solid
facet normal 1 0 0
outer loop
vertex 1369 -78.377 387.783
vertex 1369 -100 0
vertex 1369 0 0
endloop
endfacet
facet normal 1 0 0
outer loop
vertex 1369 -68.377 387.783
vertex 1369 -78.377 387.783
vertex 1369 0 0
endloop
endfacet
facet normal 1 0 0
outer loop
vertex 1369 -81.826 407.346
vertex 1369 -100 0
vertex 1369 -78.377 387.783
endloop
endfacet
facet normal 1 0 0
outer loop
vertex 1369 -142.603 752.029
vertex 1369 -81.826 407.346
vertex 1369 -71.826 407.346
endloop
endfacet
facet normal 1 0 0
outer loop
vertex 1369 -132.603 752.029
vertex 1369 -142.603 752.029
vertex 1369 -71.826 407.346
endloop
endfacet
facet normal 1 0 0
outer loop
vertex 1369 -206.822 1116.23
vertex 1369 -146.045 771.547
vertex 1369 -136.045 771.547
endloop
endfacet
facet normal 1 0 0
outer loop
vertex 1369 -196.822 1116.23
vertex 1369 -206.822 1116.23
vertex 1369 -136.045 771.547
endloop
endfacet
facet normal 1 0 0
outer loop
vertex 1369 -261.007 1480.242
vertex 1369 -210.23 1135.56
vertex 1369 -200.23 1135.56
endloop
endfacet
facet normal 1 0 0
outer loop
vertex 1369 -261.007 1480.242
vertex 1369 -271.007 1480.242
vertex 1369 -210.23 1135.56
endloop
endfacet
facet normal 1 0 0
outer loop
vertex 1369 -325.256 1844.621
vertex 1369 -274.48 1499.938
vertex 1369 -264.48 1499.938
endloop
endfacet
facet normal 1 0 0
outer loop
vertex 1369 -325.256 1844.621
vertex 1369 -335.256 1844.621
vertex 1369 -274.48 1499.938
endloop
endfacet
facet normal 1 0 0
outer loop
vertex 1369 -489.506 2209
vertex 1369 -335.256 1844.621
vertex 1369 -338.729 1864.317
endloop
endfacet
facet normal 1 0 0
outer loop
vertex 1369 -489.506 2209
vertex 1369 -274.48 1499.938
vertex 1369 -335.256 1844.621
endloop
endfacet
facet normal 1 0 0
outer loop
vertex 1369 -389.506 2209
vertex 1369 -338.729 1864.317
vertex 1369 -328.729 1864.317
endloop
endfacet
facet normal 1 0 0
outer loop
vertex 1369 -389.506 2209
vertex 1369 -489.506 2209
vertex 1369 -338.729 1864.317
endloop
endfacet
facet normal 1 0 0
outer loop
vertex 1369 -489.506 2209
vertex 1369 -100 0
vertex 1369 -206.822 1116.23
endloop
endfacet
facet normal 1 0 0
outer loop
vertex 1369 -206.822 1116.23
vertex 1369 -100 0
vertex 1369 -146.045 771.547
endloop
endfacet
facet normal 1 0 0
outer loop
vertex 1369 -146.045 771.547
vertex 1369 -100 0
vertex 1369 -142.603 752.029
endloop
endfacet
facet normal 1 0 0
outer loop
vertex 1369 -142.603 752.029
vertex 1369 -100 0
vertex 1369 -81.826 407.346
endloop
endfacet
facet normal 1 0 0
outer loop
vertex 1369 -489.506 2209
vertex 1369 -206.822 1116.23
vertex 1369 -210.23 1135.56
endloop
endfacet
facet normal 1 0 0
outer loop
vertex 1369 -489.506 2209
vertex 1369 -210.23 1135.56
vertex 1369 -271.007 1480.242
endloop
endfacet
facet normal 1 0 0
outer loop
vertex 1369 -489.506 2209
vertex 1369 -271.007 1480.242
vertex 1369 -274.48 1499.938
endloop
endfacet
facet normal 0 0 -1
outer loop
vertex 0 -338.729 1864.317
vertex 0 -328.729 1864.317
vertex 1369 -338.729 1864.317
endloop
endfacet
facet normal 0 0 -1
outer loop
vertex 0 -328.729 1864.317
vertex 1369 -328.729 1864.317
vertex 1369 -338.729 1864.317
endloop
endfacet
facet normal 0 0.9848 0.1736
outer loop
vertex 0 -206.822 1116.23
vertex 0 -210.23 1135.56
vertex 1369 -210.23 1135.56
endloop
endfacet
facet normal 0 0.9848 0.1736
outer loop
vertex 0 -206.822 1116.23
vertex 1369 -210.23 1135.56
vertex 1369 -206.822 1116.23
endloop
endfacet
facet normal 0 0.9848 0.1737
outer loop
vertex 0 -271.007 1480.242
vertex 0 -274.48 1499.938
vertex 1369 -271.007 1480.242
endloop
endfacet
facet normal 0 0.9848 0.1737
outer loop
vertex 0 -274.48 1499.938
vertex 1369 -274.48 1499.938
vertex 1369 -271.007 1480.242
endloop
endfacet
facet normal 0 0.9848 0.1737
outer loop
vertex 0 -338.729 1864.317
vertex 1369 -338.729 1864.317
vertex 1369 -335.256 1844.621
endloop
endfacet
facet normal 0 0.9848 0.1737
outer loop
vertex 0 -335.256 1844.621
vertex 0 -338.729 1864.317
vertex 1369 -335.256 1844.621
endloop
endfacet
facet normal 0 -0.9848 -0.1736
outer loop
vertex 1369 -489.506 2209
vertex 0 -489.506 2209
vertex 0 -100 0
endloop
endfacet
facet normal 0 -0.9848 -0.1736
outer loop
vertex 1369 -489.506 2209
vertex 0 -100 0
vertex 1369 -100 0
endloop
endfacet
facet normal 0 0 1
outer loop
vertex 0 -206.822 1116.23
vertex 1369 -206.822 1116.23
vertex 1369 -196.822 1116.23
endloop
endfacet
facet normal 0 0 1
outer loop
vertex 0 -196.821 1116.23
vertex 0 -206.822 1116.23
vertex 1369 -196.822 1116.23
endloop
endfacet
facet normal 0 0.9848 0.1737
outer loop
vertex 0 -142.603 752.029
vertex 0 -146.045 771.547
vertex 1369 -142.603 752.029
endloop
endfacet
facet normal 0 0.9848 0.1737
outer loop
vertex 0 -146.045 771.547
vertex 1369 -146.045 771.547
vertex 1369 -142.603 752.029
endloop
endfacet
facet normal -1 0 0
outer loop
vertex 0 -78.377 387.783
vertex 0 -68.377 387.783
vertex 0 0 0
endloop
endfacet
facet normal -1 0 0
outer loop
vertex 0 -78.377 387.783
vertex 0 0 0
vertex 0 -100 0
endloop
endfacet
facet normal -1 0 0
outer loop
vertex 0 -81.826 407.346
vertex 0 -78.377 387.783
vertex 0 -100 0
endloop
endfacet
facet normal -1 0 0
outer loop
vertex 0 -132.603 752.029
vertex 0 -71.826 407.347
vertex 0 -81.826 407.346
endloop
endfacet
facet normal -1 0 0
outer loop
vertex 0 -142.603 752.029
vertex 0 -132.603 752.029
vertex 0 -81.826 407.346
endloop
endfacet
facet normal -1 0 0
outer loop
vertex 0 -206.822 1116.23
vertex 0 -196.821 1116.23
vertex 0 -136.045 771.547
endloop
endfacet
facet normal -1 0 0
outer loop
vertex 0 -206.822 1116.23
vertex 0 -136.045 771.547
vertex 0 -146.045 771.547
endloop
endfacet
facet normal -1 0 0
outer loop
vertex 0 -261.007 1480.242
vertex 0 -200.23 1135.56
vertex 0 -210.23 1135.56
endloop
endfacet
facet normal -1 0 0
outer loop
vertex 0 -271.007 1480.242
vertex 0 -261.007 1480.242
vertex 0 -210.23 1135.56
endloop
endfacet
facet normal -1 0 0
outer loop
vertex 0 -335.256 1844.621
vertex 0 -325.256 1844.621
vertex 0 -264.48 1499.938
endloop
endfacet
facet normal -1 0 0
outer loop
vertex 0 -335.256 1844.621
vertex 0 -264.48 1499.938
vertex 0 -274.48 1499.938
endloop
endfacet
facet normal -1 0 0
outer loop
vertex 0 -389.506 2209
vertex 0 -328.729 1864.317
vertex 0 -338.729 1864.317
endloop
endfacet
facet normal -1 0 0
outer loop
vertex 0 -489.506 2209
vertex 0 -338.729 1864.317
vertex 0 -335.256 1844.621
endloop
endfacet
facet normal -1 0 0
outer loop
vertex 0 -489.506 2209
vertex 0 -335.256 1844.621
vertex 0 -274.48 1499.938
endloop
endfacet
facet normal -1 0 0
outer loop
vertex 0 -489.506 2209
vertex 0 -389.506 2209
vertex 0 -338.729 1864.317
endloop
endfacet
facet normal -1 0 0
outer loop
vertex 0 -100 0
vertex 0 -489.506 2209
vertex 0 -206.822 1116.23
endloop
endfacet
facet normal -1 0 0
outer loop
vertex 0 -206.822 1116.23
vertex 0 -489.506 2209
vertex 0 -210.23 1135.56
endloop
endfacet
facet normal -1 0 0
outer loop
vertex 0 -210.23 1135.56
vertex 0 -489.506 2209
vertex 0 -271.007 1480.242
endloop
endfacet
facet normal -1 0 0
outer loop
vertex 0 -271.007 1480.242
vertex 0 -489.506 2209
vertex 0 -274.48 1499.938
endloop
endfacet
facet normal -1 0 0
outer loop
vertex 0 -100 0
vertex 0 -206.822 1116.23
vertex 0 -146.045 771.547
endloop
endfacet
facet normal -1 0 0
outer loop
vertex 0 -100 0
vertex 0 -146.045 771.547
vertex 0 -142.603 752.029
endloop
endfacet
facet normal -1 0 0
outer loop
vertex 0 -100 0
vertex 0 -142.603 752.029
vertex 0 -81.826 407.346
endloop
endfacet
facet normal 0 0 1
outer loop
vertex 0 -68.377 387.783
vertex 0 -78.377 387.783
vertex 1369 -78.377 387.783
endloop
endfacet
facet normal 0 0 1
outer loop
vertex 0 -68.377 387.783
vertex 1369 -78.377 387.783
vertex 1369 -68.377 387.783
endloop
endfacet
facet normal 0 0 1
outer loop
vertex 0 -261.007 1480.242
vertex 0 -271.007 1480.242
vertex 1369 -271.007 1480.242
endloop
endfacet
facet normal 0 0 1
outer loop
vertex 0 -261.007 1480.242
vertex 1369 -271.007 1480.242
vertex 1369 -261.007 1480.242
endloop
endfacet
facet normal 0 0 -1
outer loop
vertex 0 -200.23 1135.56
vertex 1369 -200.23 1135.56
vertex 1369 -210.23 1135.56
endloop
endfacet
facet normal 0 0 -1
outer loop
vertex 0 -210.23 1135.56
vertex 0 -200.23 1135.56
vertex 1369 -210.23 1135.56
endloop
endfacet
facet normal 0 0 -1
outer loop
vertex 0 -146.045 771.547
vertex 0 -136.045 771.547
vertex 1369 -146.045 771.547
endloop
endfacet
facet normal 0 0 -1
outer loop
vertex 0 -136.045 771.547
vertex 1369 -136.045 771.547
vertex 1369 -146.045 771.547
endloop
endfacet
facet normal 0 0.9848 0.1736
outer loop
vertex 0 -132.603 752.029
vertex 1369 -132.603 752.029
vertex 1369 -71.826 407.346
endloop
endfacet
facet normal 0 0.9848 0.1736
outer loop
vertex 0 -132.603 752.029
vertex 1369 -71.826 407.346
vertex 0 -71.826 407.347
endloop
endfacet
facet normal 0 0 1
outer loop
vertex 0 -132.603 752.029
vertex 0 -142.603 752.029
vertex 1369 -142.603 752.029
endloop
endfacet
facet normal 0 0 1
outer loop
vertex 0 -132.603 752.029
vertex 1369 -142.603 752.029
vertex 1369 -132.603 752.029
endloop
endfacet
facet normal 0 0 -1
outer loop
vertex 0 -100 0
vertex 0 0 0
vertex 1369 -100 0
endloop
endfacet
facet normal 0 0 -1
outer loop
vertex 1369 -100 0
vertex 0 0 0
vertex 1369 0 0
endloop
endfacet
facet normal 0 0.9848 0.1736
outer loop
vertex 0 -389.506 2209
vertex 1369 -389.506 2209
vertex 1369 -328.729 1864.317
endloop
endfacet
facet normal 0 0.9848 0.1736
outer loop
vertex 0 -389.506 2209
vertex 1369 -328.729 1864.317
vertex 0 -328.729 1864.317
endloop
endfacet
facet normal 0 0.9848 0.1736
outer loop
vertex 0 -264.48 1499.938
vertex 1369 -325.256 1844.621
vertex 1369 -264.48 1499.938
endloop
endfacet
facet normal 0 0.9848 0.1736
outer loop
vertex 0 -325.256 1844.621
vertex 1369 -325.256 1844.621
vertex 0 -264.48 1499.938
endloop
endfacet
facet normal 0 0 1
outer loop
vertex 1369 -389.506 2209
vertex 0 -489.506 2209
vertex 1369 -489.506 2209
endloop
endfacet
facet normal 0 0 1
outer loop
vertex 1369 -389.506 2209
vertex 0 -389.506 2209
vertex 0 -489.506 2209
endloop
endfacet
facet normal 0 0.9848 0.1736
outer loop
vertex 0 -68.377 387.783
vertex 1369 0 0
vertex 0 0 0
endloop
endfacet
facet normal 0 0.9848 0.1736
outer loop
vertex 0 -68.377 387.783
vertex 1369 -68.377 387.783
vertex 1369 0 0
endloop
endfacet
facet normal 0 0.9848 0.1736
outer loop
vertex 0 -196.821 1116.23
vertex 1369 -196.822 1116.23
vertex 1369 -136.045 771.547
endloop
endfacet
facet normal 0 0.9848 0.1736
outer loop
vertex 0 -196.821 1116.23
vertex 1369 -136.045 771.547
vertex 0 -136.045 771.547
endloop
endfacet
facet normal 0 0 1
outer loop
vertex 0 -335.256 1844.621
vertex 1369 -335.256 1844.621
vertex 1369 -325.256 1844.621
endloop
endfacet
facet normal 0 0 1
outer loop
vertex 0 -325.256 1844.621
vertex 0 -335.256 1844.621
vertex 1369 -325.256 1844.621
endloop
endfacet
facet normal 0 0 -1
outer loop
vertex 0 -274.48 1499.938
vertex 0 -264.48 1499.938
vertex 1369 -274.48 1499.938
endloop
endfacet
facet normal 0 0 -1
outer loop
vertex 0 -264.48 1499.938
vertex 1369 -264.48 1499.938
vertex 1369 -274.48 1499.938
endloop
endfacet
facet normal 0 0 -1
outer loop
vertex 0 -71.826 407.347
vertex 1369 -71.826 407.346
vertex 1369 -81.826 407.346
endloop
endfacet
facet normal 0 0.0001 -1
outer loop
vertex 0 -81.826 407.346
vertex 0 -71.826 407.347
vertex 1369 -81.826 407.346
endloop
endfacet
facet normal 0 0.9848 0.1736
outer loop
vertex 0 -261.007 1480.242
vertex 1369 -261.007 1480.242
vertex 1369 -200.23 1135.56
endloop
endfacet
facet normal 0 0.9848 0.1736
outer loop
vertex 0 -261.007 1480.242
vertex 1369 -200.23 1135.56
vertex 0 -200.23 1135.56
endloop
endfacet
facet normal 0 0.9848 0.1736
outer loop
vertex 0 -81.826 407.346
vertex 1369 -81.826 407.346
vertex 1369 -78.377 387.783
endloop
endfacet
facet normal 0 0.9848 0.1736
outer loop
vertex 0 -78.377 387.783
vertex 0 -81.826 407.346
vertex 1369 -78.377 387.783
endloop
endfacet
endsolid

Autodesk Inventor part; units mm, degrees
ref_plane "YZ Plane" through (0, 0, 0) normal (1, 0, 0) x (0, 1, 0)
ref_plane "Work Plane2" through (0, 0, 2209) normal (0, 0, 1) x (1, 0, 0)
ref_plane "Work Plane1" through (0, 0, 0) normal (0, 0, 1) x (1, 0, 0)
sketch "Sketch1" plane through (0, 0, 0) normal (0, 0, 1) x (1, 0, 0)
  line L0 (0, 0) -> (1369, 0)
  line L1 (1369, 0) -> (1369, -100)
  line L2 (1369, -100) -> (0, -100)
  line L3 (0, -100) -> (0, 0)
  dimension "d2" = 1369
  dimension "d3" = 100
sketch "Sketch2" plane through (0, 0, 2209) normal (0, 0, 1) x (1, 0, 0)
  line L0 (0, -100) -> (0, 0) projected
  line L1 (1369, 0) -> (1369, -100) projected
ref_plane "Work Plane3" through (0, -100, 0) normal (1, 0, 0) x (0, 1, 0)
sketch "Sketch3" plane through (0, -100, 0) normal (1, 0, 0) x (0, 1, 0)
  line L0 (0, 2209) -> (100, 2209) projected
  line L1 (0, 0) -> (100, 0) construction
  line L2 (100, 0) -> (-289.5063, 2209)
  line L3 (100, 0) -> (2343.0774, 0) construction
  line L4 (-289.5063, 2209) -> (-389.5063, 2209)
  line L5 (-389.5063, 2209) -> (0, 0)
  dimension "d4" = 100
  dimension "d5" = 100
sketch "Sketch4" plane through (0, 0, 2209) normal (0, 0, 1) x (1, 0, 0)
  line L0 (0, -389.5063) -> (0, -489.5063) projected
  line L1 (1369, 0) -> (1369, -100) projected
  line L2 (0, -389.5063) -> (1369, -389.5063)
  line L3 (1369, -389.5063) -> (1369, -489.5063)
  line L4 (1369, -489.5063) -> (0, -489.5063)
  line L5 (0, -489.5063) -> (0, -389.5063)
  point P0 (0, 0)
loft "Loft1" add profiles "Sketch1", "Sketch4"
sketch "Sketch5" plane through (1369, -100, 0) normal (1, 0, 0) x (0, 0, -1)
  line L0 (0, 100) -> (0, 0) projected
  line L1 (0, 100) -> (-2209, -289.5063) projected
  line L2 (-2209, -289.5063) -> (-2209, -389.5063) projected
  line L3 (0, 0) -> (-2209, -389.5063) projected
  line L4 (-2209, -289.5063) -> (-1864.3173, -228.7294)
  line L5 (0, 100) -> (-2209, -289.5063) projected
  line L6 (-1864.3173, -228.7294) -> (-1864.3173, -238.7294)
  line L7 (-1864.3173, -238.7294) -> (-1844.6211, -235.2565)
  line L8 (-1844.6211, -235.2565) -> (-1844.6211, -225.2565)
  line L9 (-1844.6211, -225.2565) -> (-1499.9384, -164.4796)
  line L10 (-1499.9384, -164.4796) -> (-1499.9384, -174.4796)
  line L11 (-1499.9384, -174.4796) -> (-1480.2423, -171.0066)
  line L12 (-1480.2423, -171.0066) -> (-1480.2423, -161.0066)
  line L13 (-1480.2423, -161.0066) -> (-1135.5595, -100.2298)
  line L14 (-1135.5595, -100.2298) -> (-1135.5595, -110.2298)
  line L15 (-1135.5595, -110.2298) -> (-1116.23, -106.8215)
  line L16 (-1116.23, -106.8215) -> (-1116.23, -96.8215)
  line L17 (-1116.23, -96.8215) -> (-771.5473, -36.0446)
  line L18 (-771.5473, -36.0446) -> (-771.5473, -46.0446)
  line L19 (-771.5473, -46.0446) -> (-752.0292, -42.603)
  line L20 (-752.0292, -42.603) -> (-752.0292, -32.603)
  line L21 (-752.0292, -32.603) -> (-407.3465, 28.1738)
  line L22 (-407.3465, 28.1738) -> (-407.3465, 18.1738)
  line L23 (-407.3465, 18.1738) -> (-387.7831, 21.6234)
  line L24 (-387.7831, 21.6234) -> (-387.7831, 31.6234)
  line L25 (-387.7831, 31.6234) -> (0, 100)
  line L26 (-387.7831, 31.6234) -> (-1864.3173, -228.7294)
  point P0 (-771.5473, -36.0446)
  point P1 (-1135.5595, -100.2298)
  dimension "d10" = 350
  dimension "d11" = 10
  dimension "d12" = 20
  dimension "d13" = 350
  dimension "d14" = 20
  dimension "d15" = 350
  dimension "d16" = 350
  dimension "d17" = 350
extrude "Extrusion1" cut sketch "Sketch5" against normal through all contours L24 L23 L22 L1 | L20 L19 L18 L1 | L1 L8 L7 L6 | L16 L15 L14 L1 | L1 L12 L11 L10
properties part number "eave_panel_01" material "Wood (Maple)"
